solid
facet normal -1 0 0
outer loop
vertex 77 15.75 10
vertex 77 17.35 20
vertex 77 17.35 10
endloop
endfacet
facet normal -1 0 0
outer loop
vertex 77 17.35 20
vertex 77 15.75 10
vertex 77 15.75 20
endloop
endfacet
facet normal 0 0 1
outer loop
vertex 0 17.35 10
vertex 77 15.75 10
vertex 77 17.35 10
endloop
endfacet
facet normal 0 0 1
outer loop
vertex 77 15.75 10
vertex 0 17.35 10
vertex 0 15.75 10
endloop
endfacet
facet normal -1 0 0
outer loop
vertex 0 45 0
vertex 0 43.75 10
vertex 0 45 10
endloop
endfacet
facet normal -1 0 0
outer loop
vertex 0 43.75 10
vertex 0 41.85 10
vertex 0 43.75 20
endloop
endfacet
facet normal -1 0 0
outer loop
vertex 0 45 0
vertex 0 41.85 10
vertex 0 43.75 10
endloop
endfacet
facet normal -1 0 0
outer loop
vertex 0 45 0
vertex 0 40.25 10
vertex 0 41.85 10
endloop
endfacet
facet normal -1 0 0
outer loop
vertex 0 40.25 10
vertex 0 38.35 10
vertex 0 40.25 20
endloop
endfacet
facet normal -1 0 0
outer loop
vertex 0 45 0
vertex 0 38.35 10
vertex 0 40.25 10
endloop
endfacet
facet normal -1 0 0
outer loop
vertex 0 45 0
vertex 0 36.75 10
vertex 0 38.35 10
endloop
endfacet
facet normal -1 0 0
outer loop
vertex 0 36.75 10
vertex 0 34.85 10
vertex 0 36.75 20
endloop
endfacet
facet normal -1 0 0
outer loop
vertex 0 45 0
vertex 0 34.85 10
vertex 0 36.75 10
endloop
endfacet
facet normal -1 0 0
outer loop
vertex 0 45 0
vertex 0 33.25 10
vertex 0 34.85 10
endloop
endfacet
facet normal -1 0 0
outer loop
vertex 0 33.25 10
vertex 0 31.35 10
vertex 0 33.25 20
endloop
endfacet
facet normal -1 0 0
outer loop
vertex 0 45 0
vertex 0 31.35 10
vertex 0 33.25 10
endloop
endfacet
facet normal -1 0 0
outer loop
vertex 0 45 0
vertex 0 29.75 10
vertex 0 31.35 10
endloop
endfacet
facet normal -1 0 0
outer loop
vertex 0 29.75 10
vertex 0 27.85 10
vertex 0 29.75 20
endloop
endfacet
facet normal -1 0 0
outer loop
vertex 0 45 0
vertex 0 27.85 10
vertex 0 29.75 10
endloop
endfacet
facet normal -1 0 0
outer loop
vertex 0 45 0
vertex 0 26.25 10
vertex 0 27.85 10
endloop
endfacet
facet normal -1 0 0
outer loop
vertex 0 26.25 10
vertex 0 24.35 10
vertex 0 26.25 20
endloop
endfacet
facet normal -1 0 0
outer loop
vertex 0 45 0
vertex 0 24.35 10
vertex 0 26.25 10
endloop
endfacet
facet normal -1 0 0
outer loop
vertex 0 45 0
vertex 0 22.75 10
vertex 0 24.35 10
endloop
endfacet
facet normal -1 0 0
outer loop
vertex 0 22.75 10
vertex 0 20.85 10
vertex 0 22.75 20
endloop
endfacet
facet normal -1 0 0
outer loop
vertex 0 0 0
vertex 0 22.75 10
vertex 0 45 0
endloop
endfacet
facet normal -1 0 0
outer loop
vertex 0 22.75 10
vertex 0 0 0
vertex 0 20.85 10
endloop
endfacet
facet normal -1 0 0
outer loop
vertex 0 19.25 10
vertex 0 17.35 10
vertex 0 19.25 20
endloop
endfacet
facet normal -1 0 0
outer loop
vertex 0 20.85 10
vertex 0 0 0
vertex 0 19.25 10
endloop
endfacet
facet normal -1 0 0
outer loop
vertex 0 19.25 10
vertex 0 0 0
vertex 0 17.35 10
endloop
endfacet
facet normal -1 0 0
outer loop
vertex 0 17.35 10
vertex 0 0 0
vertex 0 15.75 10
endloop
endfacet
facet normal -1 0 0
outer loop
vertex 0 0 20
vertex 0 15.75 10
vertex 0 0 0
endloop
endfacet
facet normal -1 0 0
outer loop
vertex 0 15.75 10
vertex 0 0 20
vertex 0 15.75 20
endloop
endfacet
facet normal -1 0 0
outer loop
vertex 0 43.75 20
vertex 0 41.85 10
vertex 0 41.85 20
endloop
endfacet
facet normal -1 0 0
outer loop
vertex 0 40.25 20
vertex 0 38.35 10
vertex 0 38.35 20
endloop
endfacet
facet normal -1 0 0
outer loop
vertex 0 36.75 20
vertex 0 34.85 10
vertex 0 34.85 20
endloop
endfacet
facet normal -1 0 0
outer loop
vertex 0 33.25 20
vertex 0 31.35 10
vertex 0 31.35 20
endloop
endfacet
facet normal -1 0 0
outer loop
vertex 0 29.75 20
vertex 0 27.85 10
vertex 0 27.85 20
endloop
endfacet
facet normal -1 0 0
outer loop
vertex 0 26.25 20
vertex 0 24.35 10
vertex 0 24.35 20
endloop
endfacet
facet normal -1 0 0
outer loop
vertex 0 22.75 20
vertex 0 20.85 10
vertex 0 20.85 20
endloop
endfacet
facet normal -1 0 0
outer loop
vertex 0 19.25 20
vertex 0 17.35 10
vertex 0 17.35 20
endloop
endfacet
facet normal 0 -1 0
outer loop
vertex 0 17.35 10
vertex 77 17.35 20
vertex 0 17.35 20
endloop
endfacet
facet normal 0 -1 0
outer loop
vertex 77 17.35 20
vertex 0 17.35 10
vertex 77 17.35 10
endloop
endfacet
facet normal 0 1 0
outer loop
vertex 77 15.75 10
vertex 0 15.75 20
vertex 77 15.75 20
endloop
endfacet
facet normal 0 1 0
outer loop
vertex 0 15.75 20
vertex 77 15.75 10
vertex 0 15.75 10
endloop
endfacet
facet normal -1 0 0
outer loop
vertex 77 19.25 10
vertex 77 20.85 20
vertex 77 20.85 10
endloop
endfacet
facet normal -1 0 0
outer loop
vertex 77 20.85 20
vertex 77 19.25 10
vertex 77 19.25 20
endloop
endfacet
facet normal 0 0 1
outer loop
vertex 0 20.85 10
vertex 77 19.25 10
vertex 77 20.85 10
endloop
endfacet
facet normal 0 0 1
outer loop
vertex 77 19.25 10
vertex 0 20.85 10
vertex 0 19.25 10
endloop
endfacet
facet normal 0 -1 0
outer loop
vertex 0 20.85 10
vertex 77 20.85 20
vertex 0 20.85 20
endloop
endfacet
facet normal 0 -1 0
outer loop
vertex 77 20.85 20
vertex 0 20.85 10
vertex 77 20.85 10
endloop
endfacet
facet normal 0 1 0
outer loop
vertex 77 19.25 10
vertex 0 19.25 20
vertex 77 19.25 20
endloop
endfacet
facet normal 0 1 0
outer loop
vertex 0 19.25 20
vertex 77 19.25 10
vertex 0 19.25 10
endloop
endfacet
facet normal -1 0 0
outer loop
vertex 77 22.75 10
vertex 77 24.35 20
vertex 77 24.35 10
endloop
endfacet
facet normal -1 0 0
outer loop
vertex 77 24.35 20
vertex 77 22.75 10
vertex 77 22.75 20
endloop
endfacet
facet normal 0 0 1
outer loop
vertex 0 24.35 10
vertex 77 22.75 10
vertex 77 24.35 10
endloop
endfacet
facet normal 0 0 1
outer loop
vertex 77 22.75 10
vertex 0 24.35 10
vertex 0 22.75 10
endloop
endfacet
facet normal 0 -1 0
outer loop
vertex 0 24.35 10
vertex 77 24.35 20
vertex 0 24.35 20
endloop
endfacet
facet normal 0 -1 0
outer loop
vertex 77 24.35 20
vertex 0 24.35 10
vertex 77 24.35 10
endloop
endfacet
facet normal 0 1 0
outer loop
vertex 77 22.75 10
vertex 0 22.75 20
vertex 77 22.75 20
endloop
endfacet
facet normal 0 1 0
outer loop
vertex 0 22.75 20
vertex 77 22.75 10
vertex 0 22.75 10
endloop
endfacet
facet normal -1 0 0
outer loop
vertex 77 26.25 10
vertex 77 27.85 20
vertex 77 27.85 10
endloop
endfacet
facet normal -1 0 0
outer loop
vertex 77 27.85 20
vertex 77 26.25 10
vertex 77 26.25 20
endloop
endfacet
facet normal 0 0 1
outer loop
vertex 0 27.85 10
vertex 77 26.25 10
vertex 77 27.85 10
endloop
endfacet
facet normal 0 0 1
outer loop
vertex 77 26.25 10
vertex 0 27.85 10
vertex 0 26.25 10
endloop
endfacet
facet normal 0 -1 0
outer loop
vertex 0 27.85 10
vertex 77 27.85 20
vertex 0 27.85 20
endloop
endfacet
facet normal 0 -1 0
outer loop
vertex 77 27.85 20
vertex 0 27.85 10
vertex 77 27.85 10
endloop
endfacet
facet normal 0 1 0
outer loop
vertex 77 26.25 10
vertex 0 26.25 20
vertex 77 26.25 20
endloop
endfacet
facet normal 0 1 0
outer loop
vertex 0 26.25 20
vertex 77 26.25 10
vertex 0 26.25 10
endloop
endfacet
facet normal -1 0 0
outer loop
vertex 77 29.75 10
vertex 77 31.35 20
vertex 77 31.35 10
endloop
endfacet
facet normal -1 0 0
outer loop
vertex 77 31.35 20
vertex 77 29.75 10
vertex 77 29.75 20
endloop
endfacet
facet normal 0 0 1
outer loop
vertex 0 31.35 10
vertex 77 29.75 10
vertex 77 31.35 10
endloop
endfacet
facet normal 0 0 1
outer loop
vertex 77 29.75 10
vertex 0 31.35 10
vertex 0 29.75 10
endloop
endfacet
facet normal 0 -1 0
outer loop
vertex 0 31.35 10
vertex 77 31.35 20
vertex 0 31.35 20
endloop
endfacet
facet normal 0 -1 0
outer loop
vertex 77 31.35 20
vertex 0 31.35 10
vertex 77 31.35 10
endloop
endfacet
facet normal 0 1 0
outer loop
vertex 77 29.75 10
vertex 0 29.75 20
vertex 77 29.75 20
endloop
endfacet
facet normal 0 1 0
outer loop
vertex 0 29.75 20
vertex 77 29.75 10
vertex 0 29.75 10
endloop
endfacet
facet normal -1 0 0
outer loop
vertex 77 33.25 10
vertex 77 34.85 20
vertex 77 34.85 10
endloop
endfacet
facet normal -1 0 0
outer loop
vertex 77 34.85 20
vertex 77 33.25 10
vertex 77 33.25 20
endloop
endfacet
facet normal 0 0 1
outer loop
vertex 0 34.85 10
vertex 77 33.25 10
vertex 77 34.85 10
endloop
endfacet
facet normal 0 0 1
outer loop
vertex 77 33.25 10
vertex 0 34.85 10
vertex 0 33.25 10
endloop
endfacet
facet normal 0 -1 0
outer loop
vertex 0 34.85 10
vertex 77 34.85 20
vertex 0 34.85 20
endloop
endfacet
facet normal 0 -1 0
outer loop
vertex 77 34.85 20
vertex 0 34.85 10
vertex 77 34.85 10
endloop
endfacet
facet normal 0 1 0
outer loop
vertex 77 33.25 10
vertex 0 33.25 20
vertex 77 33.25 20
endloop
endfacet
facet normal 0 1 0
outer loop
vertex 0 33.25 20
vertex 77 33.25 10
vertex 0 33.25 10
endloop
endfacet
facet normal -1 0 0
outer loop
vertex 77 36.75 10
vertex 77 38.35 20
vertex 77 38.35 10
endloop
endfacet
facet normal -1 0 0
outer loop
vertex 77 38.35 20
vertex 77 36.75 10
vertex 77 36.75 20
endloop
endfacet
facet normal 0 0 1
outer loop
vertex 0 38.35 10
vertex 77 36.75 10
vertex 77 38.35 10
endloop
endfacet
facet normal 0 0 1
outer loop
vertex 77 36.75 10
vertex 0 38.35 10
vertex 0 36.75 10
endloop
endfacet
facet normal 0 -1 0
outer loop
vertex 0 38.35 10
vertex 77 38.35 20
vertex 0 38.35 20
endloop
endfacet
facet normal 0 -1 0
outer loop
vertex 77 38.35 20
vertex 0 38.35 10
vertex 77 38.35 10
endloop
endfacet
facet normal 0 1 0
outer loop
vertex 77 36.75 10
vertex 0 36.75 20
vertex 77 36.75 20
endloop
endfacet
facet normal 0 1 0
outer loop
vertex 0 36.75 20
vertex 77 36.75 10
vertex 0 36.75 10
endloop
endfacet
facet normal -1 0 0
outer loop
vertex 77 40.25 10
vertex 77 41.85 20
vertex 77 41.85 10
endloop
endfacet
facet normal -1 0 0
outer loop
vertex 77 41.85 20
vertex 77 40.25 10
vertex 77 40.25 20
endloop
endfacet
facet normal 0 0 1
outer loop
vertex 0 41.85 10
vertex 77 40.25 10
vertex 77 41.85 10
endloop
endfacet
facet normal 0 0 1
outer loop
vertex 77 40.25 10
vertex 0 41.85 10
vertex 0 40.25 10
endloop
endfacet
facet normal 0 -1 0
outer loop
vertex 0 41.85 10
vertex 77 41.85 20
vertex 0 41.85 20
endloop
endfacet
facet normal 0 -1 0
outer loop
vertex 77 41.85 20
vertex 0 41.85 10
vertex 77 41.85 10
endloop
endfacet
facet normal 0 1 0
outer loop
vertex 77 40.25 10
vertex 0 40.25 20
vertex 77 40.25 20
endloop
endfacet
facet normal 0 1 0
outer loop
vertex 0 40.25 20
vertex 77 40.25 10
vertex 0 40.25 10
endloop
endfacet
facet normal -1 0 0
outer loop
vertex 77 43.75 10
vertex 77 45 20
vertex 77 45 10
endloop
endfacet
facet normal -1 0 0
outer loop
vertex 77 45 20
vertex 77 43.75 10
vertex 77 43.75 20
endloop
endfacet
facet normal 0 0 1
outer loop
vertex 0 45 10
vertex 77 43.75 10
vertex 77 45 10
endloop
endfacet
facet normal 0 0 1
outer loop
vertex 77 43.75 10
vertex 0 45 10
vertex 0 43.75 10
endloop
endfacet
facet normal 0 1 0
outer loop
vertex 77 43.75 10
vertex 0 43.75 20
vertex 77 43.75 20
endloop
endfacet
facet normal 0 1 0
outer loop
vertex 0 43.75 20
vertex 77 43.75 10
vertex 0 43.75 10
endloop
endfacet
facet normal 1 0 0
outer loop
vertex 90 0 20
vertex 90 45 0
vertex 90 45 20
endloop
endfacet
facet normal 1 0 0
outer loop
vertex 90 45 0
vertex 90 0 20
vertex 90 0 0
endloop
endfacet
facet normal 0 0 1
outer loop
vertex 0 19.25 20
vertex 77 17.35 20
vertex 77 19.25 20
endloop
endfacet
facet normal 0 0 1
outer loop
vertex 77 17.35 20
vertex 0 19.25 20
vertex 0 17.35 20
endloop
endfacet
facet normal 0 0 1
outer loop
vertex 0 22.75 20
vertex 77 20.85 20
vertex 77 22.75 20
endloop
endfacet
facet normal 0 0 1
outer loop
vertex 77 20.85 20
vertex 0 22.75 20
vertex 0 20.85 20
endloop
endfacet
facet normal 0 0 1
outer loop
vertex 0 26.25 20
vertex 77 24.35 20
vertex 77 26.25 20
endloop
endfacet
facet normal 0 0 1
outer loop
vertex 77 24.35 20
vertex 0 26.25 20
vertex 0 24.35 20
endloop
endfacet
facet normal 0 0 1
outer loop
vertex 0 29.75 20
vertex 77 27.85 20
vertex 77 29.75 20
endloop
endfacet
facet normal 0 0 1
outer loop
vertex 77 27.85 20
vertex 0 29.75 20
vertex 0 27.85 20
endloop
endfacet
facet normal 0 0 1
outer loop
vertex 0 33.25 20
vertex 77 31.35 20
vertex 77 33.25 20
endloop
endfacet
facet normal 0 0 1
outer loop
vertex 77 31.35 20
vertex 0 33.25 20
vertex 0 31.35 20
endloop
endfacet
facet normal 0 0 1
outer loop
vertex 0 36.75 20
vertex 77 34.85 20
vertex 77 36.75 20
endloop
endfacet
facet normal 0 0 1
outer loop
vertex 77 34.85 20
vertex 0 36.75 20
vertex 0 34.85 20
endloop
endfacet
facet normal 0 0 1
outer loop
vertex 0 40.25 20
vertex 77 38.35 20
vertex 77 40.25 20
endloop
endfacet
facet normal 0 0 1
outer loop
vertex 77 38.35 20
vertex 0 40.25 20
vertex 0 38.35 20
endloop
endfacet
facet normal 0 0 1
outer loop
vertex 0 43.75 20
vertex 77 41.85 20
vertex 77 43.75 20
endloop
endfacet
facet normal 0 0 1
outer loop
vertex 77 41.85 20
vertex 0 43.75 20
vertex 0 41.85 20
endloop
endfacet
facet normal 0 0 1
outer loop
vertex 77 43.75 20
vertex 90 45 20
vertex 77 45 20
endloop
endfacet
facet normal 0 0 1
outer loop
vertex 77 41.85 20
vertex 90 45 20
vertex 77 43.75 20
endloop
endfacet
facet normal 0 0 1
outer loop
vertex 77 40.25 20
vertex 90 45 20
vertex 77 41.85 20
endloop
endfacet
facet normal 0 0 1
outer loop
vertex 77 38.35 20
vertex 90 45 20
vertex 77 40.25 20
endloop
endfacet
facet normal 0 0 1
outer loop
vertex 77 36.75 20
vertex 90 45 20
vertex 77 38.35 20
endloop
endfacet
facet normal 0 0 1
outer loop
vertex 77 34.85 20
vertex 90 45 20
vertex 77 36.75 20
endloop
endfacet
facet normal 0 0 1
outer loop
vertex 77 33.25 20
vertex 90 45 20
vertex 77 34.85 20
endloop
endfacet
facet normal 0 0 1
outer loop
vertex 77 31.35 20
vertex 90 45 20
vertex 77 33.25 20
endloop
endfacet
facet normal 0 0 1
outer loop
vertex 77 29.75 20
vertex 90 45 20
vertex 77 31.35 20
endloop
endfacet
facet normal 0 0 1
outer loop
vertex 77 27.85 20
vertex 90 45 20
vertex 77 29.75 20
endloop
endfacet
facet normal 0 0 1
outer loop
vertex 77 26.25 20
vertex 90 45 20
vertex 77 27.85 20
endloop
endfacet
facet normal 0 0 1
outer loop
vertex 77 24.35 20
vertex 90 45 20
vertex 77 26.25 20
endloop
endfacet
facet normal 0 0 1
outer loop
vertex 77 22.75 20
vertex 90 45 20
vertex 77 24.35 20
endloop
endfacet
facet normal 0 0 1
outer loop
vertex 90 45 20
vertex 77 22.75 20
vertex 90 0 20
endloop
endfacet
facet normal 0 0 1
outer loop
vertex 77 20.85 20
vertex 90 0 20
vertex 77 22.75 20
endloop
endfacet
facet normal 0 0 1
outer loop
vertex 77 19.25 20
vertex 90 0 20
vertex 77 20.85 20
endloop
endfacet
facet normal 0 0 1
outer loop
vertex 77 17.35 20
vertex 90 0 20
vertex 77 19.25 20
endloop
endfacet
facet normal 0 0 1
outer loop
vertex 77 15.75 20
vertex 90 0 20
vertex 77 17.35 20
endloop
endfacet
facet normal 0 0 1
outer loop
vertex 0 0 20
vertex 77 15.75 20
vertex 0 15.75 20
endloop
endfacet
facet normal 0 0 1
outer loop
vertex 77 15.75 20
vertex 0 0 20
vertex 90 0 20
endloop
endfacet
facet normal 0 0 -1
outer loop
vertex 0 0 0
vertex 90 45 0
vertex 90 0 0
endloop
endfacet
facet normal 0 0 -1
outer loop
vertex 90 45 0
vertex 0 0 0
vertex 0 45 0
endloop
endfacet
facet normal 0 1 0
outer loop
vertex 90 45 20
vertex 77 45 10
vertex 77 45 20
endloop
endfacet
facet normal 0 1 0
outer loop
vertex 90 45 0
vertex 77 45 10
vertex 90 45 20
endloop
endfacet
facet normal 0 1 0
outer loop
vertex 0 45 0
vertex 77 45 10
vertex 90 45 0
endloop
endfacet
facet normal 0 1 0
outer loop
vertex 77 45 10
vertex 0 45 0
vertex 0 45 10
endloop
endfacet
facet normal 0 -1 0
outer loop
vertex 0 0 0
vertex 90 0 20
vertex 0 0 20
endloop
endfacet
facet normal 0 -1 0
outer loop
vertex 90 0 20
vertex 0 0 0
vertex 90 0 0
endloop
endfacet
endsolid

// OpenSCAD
// Drying Rack for 10 Microscope Slides
// Base: 90mm (X) x 45mm (Y) x 20mm (Z)
// Slots: 10 parallel slots along X, 77mm long, 1.6mm wide, 10mm deep
// Spacing: 3.5mm centre-to-centre (Y), group centred on block

$fn = 128;

// Base Dimensions
base_length_X = 90;
base_width_Y = 45;
base_height_Z = 20;

// Slide Dimensions (for reference)
slide_length = 75;
slide_width = 25;
slide_thickness = 1;

// Slot Dimensions
slot_length_X = 77;
slot_width_Y = 1.6;
slot_depth_Z = 10;

// Layout Dimensions
slot_spacing_Y = 3.5; // Centre-to-centre
num_slots = 10;

// Calculate Y position of the first slot centre
// The group of slots is centred on the block in Y.
// Distance from centre to the centre of the first slot = (num_slots - 1) * slot_spacing_Y / 2
offset_Y_first = ((num_slots - 1) * slot_spacing_Y) / 2;

// Generate the base block
difference() {
    // Main Block
    cube([base_length_X, base_width_Y, base_height_Z]);
    
    // Cut Slots
    for (i = [0 : num_slots - 1]) {
        // Calculate Y position for this slot
        y_pos = offset_Y_first + (i * slot_spacing_Y);
        
        // Slot geometry:
        // Length along X: slot_length_X
        // Width along Y: slot_width_Y
        // Depth along Z: slot_depth_Z
        // Position: X is centred (0), Y is y_pos, Z starts at base_height_Z - slot_depth_Z
        
        // We extend the cutting shape slightly past the top face to ensure clean cut
        translate([0, y_pos, base_height_Z - slot_depth_Z]) {
            cube([slot_length_X, slot_width_Y, slot_depth_Z + 0.1]);
        }
    }
}
